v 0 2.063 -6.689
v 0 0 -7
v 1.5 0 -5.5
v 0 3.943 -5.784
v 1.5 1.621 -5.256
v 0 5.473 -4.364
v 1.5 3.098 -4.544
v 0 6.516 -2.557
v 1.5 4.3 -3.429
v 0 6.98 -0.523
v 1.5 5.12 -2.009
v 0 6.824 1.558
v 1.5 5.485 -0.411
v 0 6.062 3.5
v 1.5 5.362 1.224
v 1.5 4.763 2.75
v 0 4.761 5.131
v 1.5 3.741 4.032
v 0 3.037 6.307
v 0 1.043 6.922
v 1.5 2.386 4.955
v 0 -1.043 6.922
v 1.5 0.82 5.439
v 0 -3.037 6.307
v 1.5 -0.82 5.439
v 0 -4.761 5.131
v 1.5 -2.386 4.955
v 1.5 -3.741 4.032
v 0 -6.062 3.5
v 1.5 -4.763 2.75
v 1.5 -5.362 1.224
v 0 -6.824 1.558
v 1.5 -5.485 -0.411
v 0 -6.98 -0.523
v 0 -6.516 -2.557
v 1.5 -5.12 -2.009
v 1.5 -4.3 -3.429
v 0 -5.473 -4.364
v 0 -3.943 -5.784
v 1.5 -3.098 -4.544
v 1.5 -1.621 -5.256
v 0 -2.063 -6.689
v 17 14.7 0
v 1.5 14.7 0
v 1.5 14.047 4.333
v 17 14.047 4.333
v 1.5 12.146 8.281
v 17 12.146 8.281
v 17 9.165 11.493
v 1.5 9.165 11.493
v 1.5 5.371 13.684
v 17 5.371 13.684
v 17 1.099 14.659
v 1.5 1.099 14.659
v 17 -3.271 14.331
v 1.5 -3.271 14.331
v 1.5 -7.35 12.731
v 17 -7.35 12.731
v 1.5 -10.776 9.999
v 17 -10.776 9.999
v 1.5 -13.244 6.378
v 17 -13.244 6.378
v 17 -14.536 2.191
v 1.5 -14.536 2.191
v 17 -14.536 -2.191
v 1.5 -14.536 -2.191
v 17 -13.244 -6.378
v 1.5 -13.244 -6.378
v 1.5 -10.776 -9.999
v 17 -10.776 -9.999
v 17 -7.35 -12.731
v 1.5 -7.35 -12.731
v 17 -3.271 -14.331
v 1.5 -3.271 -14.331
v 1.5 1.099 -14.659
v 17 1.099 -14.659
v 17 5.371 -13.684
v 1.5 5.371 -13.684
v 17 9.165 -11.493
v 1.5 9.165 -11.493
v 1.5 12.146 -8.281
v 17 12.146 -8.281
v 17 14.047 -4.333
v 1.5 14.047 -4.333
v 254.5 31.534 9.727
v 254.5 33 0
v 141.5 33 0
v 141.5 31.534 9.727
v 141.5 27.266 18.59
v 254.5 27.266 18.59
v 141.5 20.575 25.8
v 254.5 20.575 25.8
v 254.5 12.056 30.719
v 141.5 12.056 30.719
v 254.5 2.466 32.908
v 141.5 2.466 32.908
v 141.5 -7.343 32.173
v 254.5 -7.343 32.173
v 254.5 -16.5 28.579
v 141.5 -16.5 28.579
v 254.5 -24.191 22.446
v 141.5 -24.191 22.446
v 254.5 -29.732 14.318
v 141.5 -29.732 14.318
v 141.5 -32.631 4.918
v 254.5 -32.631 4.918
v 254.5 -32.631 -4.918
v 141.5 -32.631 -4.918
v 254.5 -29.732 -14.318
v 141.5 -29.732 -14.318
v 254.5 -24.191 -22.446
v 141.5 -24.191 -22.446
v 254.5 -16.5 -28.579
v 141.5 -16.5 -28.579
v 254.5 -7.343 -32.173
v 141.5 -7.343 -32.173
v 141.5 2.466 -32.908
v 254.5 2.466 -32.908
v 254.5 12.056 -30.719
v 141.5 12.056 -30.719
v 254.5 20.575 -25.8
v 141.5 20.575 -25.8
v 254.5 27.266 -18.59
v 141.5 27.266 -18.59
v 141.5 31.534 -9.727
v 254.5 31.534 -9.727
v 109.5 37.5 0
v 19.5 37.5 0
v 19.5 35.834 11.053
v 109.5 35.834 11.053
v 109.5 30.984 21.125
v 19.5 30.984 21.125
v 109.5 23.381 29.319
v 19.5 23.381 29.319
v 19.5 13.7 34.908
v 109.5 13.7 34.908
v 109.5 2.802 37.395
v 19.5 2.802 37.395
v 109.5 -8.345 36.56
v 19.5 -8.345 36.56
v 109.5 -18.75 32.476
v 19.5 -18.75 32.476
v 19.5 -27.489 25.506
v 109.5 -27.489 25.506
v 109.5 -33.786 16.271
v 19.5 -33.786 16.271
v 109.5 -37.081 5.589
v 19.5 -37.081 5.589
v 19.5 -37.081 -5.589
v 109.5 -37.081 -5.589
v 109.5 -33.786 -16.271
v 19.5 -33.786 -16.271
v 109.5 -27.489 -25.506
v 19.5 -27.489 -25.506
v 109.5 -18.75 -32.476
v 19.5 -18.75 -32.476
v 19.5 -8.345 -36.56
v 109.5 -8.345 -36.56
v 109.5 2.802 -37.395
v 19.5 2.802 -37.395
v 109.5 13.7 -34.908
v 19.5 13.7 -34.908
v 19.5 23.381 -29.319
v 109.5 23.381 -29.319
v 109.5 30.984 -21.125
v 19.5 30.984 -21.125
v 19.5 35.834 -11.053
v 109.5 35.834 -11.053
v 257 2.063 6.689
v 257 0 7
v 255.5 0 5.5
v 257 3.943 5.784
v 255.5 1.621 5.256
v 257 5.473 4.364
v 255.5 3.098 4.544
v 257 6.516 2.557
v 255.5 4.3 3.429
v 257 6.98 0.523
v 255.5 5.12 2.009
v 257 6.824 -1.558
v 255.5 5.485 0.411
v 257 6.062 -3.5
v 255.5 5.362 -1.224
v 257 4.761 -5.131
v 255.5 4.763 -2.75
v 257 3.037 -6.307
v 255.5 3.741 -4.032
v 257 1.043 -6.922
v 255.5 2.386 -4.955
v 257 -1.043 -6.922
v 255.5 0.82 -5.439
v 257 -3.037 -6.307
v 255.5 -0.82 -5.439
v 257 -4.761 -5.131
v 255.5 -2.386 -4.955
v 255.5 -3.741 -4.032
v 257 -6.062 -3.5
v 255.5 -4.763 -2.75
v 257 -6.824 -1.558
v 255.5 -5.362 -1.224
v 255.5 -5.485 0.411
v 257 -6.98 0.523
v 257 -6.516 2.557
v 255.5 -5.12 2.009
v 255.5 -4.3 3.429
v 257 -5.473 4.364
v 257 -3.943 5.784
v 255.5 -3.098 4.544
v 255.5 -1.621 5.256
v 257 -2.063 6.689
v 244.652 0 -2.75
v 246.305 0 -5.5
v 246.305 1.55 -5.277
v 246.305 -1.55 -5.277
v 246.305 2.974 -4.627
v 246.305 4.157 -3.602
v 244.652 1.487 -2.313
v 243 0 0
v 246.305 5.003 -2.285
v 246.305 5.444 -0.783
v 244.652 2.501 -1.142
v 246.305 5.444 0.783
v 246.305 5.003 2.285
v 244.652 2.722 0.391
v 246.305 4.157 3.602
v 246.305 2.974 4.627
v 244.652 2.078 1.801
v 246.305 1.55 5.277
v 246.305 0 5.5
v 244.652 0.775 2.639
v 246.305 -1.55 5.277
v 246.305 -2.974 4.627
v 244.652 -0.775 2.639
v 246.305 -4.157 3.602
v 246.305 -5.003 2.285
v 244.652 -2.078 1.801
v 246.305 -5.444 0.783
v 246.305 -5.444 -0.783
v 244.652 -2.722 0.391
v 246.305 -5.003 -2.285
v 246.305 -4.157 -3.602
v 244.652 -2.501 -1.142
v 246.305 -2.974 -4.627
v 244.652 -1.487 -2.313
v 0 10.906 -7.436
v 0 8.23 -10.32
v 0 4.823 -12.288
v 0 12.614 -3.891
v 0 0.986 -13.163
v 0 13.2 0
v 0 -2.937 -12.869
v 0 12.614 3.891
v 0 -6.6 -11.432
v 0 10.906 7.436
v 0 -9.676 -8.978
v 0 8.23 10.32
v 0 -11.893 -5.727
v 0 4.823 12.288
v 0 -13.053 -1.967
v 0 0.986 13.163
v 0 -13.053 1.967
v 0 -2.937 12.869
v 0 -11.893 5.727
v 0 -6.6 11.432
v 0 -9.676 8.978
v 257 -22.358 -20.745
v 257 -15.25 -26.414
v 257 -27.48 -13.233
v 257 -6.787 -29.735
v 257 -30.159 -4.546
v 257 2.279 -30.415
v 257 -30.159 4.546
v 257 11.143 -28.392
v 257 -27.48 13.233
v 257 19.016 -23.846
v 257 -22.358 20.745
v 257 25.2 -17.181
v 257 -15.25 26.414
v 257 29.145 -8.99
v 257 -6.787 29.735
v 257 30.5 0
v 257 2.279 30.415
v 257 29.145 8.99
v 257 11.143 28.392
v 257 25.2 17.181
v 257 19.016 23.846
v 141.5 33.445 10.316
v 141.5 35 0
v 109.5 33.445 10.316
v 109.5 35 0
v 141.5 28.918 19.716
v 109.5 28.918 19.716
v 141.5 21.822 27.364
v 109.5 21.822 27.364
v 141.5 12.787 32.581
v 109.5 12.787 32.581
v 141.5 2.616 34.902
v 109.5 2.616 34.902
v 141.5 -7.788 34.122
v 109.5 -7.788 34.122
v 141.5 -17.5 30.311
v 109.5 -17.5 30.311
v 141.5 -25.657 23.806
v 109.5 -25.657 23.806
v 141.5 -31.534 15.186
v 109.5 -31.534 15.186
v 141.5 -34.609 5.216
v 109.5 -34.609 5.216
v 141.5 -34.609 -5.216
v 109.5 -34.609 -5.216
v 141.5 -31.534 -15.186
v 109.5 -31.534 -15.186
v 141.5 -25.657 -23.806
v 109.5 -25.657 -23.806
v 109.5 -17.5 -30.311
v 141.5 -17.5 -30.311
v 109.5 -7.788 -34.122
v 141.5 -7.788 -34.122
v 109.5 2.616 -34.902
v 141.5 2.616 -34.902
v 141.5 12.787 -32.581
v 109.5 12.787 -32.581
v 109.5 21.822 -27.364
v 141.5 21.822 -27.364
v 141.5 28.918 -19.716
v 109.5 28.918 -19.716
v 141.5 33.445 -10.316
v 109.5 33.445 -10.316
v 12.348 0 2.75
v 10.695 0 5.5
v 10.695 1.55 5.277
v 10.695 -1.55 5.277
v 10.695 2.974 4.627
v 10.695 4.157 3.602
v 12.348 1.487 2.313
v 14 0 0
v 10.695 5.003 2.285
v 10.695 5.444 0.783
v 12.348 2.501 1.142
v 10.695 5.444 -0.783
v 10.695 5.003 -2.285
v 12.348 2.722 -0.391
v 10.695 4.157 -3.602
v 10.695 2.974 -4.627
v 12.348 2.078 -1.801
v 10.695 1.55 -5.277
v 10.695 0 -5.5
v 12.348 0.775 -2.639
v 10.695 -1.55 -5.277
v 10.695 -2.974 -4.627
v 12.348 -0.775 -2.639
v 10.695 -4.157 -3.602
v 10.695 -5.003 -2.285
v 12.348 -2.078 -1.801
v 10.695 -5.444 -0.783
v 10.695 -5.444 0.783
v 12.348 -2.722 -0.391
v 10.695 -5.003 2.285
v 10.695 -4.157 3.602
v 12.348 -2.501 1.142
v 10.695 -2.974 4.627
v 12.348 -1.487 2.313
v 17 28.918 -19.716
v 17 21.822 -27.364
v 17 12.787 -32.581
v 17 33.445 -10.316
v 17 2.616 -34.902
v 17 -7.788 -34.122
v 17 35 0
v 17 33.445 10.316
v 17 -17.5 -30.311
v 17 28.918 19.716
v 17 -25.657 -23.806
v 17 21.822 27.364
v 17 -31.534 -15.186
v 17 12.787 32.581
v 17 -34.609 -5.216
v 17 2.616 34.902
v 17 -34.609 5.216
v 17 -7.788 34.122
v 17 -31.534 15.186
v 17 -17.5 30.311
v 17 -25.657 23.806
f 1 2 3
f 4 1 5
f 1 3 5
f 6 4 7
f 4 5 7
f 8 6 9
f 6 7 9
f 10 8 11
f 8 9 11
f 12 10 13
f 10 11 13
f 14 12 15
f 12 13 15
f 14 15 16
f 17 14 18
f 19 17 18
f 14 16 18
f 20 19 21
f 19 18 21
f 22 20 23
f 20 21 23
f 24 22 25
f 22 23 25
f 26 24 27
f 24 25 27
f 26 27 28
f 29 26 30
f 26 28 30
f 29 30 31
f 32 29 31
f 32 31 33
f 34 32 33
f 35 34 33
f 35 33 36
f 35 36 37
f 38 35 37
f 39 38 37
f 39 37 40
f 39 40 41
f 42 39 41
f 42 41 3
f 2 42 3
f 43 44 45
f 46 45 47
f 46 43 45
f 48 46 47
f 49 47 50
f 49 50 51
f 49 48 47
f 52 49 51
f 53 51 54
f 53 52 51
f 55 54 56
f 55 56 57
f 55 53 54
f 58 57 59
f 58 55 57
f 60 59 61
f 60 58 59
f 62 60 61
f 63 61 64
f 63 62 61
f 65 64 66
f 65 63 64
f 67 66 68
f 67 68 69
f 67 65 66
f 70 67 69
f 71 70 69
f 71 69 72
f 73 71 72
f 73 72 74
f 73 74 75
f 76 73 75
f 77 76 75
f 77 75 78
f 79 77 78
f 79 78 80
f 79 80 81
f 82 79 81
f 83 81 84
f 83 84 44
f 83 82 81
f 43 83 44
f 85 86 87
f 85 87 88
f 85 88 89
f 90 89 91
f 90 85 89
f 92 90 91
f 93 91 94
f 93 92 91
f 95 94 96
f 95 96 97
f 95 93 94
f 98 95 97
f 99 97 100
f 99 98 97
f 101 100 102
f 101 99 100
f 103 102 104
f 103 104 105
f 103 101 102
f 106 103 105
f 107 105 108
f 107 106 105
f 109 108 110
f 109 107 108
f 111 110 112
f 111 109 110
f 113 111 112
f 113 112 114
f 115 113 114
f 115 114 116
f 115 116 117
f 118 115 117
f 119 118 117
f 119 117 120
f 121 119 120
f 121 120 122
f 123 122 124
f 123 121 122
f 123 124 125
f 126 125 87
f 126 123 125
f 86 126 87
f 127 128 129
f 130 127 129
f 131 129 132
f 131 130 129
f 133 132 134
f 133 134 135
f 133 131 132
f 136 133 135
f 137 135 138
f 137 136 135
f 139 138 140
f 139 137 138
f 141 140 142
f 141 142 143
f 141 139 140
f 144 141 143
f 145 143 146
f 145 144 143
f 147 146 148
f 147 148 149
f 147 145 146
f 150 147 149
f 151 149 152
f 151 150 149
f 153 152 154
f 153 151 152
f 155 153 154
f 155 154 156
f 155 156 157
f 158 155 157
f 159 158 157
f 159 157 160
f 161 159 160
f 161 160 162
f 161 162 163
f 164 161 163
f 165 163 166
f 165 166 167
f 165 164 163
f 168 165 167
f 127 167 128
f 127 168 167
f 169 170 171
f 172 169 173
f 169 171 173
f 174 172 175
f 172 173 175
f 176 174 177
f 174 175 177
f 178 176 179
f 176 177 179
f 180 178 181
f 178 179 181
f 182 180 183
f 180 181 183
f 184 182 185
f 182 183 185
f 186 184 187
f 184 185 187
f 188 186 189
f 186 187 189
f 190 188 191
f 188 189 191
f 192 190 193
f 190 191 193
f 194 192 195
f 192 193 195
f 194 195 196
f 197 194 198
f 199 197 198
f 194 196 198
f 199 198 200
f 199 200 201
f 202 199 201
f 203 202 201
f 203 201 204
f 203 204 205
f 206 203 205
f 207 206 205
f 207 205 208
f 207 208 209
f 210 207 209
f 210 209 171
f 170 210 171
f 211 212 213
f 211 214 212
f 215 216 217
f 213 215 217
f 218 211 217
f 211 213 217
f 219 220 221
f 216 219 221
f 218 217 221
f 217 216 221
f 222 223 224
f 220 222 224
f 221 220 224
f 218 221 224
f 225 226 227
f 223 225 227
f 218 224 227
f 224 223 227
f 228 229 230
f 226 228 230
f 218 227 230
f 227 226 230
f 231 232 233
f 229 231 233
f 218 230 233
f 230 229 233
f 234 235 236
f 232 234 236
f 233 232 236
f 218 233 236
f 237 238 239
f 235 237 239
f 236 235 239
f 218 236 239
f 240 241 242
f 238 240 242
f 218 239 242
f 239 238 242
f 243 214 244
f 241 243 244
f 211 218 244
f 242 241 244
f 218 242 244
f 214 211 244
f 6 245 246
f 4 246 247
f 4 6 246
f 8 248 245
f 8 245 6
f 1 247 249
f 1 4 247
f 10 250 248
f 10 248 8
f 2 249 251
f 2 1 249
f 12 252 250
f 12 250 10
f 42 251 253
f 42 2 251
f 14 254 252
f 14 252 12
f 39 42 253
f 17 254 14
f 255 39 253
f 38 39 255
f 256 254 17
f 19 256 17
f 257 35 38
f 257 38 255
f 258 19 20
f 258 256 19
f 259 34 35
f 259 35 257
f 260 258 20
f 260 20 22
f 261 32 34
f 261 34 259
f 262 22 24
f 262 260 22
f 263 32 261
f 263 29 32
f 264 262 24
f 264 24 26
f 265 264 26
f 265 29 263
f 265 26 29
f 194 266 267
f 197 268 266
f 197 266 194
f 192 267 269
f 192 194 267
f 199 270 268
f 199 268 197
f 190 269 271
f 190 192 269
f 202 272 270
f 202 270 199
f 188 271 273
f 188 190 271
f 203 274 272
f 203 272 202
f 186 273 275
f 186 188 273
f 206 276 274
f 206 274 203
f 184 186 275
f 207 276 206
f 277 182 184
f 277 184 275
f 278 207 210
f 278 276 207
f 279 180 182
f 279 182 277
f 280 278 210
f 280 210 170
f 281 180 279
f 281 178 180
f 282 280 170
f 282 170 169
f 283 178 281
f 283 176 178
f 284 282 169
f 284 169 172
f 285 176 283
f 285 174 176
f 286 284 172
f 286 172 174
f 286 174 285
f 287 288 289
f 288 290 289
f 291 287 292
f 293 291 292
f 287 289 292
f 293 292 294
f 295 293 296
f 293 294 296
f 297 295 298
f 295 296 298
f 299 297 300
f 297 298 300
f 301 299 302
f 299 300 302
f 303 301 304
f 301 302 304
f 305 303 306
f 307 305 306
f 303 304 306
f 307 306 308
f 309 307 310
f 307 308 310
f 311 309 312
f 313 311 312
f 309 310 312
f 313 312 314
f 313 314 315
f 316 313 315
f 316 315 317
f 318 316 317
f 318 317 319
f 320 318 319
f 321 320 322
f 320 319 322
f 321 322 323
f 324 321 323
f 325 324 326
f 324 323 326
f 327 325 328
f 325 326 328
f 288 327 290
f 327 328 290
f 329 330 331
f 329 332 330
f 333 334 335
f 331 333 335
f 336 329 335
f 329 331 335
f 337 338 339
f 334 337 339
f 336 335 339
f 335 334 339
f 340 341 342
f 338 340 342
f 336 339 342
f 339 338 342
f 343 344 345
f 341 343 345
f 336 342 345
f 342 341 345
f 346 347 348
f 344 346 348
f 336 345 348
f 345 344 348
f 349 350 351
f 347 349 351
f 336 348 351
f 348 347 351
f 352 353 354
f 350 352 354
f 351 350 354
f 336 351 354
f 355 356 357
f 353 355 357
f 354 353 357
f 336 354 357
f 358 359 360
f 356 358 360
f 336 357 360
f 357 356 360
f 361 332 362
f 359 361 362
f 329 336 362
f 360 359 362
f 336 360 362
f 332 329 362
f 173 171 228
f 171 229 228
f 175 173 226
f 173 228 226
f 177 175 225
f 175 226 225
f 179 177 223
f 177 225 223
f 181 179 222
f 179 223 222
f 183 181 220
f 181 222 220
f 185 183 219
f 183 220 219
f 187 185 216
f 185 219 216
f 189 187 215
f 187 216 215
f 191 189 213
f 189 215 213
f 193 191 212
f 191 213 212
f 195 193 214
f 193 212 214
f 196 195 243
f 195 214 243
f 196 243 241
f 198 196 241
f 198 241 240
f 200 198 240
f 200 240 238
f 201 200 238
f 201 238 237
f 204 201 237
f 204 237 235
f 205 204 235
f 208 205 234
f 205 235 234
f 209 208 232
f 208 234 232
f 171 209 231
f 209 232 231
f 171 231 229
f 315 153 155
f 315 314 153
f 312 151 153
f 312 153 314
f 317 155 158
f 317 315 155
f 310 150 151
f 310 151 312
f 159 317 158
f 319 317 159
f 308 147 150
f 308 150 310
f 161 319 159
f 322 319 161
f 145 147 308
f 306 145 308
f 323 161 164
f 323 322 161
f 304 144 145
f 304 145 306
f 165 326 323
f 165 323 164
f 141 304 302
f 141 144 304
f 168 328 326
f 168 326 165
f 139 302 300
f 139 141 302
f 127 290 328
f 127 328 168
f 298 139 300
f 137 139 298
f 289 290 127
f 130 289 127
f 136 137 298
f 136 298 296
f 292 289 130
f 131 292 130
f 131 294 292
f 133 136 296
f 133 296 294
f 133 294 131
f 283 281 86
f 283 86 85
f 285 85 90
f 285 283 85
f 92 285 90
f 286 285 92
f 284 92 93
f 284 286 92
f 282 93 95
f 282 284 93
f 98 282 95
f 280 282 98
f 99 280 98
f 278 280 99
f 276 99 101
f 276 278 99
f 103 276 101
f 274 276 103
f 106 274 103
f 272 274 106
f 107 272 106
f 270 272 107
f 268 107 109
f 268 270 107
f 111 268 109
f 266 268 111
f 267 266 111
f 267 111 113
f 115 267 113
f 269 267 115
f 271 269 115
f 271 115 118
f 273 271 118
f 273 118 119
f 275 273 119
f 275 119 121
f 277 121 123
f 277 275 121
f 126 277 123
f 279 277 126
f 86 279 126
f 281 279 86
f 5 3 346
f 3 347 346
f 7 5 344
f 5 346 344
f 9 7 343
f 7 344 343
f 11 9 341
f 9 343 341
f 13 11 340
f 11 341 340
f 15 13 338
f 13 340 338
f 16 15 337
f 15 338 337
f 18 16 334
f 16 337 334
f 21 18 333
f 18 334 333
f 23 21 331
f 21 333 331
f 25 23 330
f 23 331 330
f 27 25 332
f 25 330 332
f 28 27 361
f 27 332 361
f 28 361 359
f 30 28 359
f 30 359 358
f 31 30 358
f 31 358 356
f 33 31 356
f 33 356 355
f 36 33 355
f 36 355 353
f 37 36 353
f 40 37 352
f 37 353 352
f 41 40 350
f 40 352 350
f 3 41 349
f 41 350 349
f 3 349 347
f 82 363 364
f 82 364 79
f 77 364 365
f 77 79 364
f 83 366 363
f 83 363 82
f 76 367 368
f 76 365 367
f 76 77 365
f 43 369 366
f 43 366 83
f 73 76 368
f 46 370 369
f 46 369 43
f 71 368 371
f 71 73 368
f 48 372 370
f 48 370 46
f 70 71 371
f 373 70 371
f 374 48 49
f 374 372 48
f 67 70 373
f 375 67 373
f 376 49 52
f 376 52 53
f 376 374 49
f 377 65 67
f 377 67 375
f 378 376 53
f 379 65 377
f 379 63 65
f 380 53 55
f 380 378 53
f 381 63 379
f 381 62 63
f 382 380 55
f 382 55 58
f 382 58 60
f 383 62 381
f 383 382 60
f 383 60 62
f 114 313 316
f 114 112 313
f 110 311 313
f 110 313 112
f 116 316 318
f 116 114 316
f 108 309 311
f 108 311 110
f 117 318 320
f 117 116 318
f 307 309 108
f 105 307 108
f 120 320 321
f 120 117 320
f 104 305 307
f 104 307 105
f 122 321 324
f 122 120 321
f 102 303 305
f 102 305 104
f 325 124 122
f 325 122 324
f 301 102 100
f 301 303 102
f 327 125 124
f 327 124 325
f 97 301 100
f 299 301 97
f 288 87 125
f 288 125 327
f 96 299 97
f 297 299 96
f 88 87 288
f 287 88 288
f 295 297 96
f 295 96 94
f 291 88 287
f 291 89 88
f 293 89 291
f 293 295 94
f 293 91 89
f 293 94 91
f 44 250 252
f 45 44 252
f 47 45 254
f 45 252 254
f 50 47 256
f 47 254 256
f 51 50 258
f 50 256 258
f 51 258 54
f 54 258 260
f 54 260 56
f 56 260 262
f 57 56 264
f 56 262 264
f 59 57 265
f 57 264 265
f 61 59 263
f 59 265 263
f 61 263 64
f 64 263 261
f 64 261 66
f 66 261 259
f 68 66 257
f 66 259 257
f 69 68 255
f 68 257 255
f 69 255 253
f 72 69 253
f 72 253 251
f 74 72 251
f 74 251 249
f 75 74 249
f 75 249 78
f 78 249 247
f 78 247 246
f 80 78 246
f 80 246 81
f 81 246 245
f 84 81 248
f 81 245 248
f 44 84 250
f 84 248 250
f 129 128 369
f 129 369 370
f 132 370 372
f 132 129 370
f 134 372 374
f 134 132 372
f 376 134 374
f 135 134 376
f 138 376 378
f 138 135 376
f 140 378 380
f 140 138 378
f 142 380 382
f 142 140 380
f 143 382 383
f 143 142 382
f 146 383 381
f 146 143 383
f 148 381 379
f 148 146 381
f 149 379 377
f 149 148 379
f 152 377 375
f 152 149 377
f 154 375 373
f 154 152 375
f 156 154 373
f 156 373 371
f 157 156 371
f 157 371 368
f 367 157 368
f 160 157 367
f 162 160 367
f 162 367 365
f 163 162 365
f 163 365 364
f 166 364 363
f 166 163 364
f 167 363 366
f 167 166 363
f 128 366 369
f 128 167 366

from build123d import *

# Parameters (mm, degrees)
CHAMFER1_SIZE                                        = 2.5
CHAMFER2_SIZE                                        = 1.5
CSK_FOR_M10_COUNTERSUNK_FLAT_HEAD_SCREW1_D           = 11
CSK_FOR_M10_COUNTERSUNK_FLAT_HEAD_SCREW1_DEPTH       = 10.695266595
CSK_FOR_M10_COUNTERSUNK_FLAT_HEAD_SCREW1_CSINK_D     = 14
CSK_FOR_M10_COUNTERSUNK_FLAT_HEAD_SCREW1_CSINK_ANGLE = 90
CSK_FOR_M10_COUNTERSUNK_FLAT_HEAD_SCREW1_TIP         = 3.304733405
CSK_FOR_M10_COUNTERSUNK_FLAT_HEAD_SCREW2_D           = 11
CSK_FOR_M10_COUNTERSUNK_FLAT_HEAD_SCREW2_DEPTH       = 10.695266595
CSK_FOR_M10_COUNTERSUNK_FLAT_HEAD_SCREW2_CSINK_D     = 14
CSK_FOR_M10_COUNTERSUNK_FLAT_HEAD_SCREW2_CSINK_ANGLE = 90
CSK_FOR_M10_COUNTERSUNK_FLAT_HEAD_SCREW2_TIP         = 3.304733405


with BuildPart() as part:
    # Sketch1 → Revolve1 (revolve)
    with BuildSketch(Plane.XY):
        Polygon((0, 0), (0, 14.7), (17, 14.7), (17, 37.5), (109.5, 37.5), (109.5, 35), (128.5, 35), (141.5, 35), (141.5, 33), (257, 33), (257, 0), align=None)
    revolve(axis=Axis((0, 0, 0), (1, 0, 0)))

    # Chamfer1
    chamfer1_edges = [part.edges().sort_by_distance(p)[0] for p in [
        (17, -37.5, 0),
        (257, -33, 0),
    ]]
    chamfer(chamfer1_edges, length=CHAMFER1_SIZE)

    # Chamfer2
    chamfer2_edges = [part.edges().sort_by_distance(p)[0] for p in [
        (0, -14.7, 0),
    ]]
    chamfer(chamfer2_edges, length=CHAMFER2_SIZE)

    # CSK for M10 Countersunk Flat Head Screw1
    with Locations(Plane.ZY):
        with Locations((0, 0)):
            CounterSinkHole(CSK_FOR_M10_COUNTERSUNK_FLAT_HEAD_SCREW1_D / 2, CSK_FOR_M10_COUNTERSUNK_FLAT_HEAD_SCREW1_CSINK_D / 2, depth=CSK_FOR_M10_COUNTERSUNK_FLAT_HEAD_SCREW1_DEPTH, counter_sink_angle=CSK_FOR_M10_COUNTERSUNK_FLAT_HEAD_SCREW1_CSINK_ANGLE)
            with Locations((0, 0, -(CSK_FOR_M10_COUNTERSUNK_FLAT_HEAD_SCREW1_DEPTH + CSK_FOR_M10_COUNTERSUNK_FLAT_HEAD_SCREW1_TIP / 2))):  # 118° drill point
                Cone(0, CSK_FOR_M10_COUNTERSUNK_FLAT_HEAD_SCREW1_D / 2, CSK_FOR_M10_COUNTERSUNK_FLAT_HEAD_SCREW1_TIP, mode=Mode.SUBTRACT)

    # CSK for M10 Countersunk Flat Head Screw2
    with Locations(Plane(origin=(257, 0, 0), x_dir=(0, 0, -1), z_dir=(1, 0, 0))):
        with Locations((0, 0)):
            CounterSinkHole(CSK_FOR_M10_COUNTERSUNK_FLAT_HEAD_SCREW2_D / 2, CSK_FOR_M10_COUNTERSUNK_FLAT_HEAD_SCREW2_CSINK_D / 2, depth=CSK_FOR_M10_COUNTERSUNK_FLAT_HEAD_SCREW2_DEPTH, counter_sink_angle=CSK_FOR_M10_COUNTERSUNK_FLAT_HEAD_SCREW2_CSINK_ANGLE)
            with Locations((0, 0, -(CSK_FOR_M10_COUNTERSUNK_FLAT_HEAD_SCREW2_DEPTH + CSK_FOR_M10_COUNTERSUNK_FLAT_HEAD_SCREW2_TIP / 2))):  # 118° drill point
                Cone(0, CSK_FOR_M10_COUNTERSUNK_FLAT_HEAD_SCREW2_D / 2, CSK_FOR_M10_COUNTERSUNK_FLAT_HEAD_SCREW2_TIP, mode=Mode.SUBTRACT)


solid = part.part
